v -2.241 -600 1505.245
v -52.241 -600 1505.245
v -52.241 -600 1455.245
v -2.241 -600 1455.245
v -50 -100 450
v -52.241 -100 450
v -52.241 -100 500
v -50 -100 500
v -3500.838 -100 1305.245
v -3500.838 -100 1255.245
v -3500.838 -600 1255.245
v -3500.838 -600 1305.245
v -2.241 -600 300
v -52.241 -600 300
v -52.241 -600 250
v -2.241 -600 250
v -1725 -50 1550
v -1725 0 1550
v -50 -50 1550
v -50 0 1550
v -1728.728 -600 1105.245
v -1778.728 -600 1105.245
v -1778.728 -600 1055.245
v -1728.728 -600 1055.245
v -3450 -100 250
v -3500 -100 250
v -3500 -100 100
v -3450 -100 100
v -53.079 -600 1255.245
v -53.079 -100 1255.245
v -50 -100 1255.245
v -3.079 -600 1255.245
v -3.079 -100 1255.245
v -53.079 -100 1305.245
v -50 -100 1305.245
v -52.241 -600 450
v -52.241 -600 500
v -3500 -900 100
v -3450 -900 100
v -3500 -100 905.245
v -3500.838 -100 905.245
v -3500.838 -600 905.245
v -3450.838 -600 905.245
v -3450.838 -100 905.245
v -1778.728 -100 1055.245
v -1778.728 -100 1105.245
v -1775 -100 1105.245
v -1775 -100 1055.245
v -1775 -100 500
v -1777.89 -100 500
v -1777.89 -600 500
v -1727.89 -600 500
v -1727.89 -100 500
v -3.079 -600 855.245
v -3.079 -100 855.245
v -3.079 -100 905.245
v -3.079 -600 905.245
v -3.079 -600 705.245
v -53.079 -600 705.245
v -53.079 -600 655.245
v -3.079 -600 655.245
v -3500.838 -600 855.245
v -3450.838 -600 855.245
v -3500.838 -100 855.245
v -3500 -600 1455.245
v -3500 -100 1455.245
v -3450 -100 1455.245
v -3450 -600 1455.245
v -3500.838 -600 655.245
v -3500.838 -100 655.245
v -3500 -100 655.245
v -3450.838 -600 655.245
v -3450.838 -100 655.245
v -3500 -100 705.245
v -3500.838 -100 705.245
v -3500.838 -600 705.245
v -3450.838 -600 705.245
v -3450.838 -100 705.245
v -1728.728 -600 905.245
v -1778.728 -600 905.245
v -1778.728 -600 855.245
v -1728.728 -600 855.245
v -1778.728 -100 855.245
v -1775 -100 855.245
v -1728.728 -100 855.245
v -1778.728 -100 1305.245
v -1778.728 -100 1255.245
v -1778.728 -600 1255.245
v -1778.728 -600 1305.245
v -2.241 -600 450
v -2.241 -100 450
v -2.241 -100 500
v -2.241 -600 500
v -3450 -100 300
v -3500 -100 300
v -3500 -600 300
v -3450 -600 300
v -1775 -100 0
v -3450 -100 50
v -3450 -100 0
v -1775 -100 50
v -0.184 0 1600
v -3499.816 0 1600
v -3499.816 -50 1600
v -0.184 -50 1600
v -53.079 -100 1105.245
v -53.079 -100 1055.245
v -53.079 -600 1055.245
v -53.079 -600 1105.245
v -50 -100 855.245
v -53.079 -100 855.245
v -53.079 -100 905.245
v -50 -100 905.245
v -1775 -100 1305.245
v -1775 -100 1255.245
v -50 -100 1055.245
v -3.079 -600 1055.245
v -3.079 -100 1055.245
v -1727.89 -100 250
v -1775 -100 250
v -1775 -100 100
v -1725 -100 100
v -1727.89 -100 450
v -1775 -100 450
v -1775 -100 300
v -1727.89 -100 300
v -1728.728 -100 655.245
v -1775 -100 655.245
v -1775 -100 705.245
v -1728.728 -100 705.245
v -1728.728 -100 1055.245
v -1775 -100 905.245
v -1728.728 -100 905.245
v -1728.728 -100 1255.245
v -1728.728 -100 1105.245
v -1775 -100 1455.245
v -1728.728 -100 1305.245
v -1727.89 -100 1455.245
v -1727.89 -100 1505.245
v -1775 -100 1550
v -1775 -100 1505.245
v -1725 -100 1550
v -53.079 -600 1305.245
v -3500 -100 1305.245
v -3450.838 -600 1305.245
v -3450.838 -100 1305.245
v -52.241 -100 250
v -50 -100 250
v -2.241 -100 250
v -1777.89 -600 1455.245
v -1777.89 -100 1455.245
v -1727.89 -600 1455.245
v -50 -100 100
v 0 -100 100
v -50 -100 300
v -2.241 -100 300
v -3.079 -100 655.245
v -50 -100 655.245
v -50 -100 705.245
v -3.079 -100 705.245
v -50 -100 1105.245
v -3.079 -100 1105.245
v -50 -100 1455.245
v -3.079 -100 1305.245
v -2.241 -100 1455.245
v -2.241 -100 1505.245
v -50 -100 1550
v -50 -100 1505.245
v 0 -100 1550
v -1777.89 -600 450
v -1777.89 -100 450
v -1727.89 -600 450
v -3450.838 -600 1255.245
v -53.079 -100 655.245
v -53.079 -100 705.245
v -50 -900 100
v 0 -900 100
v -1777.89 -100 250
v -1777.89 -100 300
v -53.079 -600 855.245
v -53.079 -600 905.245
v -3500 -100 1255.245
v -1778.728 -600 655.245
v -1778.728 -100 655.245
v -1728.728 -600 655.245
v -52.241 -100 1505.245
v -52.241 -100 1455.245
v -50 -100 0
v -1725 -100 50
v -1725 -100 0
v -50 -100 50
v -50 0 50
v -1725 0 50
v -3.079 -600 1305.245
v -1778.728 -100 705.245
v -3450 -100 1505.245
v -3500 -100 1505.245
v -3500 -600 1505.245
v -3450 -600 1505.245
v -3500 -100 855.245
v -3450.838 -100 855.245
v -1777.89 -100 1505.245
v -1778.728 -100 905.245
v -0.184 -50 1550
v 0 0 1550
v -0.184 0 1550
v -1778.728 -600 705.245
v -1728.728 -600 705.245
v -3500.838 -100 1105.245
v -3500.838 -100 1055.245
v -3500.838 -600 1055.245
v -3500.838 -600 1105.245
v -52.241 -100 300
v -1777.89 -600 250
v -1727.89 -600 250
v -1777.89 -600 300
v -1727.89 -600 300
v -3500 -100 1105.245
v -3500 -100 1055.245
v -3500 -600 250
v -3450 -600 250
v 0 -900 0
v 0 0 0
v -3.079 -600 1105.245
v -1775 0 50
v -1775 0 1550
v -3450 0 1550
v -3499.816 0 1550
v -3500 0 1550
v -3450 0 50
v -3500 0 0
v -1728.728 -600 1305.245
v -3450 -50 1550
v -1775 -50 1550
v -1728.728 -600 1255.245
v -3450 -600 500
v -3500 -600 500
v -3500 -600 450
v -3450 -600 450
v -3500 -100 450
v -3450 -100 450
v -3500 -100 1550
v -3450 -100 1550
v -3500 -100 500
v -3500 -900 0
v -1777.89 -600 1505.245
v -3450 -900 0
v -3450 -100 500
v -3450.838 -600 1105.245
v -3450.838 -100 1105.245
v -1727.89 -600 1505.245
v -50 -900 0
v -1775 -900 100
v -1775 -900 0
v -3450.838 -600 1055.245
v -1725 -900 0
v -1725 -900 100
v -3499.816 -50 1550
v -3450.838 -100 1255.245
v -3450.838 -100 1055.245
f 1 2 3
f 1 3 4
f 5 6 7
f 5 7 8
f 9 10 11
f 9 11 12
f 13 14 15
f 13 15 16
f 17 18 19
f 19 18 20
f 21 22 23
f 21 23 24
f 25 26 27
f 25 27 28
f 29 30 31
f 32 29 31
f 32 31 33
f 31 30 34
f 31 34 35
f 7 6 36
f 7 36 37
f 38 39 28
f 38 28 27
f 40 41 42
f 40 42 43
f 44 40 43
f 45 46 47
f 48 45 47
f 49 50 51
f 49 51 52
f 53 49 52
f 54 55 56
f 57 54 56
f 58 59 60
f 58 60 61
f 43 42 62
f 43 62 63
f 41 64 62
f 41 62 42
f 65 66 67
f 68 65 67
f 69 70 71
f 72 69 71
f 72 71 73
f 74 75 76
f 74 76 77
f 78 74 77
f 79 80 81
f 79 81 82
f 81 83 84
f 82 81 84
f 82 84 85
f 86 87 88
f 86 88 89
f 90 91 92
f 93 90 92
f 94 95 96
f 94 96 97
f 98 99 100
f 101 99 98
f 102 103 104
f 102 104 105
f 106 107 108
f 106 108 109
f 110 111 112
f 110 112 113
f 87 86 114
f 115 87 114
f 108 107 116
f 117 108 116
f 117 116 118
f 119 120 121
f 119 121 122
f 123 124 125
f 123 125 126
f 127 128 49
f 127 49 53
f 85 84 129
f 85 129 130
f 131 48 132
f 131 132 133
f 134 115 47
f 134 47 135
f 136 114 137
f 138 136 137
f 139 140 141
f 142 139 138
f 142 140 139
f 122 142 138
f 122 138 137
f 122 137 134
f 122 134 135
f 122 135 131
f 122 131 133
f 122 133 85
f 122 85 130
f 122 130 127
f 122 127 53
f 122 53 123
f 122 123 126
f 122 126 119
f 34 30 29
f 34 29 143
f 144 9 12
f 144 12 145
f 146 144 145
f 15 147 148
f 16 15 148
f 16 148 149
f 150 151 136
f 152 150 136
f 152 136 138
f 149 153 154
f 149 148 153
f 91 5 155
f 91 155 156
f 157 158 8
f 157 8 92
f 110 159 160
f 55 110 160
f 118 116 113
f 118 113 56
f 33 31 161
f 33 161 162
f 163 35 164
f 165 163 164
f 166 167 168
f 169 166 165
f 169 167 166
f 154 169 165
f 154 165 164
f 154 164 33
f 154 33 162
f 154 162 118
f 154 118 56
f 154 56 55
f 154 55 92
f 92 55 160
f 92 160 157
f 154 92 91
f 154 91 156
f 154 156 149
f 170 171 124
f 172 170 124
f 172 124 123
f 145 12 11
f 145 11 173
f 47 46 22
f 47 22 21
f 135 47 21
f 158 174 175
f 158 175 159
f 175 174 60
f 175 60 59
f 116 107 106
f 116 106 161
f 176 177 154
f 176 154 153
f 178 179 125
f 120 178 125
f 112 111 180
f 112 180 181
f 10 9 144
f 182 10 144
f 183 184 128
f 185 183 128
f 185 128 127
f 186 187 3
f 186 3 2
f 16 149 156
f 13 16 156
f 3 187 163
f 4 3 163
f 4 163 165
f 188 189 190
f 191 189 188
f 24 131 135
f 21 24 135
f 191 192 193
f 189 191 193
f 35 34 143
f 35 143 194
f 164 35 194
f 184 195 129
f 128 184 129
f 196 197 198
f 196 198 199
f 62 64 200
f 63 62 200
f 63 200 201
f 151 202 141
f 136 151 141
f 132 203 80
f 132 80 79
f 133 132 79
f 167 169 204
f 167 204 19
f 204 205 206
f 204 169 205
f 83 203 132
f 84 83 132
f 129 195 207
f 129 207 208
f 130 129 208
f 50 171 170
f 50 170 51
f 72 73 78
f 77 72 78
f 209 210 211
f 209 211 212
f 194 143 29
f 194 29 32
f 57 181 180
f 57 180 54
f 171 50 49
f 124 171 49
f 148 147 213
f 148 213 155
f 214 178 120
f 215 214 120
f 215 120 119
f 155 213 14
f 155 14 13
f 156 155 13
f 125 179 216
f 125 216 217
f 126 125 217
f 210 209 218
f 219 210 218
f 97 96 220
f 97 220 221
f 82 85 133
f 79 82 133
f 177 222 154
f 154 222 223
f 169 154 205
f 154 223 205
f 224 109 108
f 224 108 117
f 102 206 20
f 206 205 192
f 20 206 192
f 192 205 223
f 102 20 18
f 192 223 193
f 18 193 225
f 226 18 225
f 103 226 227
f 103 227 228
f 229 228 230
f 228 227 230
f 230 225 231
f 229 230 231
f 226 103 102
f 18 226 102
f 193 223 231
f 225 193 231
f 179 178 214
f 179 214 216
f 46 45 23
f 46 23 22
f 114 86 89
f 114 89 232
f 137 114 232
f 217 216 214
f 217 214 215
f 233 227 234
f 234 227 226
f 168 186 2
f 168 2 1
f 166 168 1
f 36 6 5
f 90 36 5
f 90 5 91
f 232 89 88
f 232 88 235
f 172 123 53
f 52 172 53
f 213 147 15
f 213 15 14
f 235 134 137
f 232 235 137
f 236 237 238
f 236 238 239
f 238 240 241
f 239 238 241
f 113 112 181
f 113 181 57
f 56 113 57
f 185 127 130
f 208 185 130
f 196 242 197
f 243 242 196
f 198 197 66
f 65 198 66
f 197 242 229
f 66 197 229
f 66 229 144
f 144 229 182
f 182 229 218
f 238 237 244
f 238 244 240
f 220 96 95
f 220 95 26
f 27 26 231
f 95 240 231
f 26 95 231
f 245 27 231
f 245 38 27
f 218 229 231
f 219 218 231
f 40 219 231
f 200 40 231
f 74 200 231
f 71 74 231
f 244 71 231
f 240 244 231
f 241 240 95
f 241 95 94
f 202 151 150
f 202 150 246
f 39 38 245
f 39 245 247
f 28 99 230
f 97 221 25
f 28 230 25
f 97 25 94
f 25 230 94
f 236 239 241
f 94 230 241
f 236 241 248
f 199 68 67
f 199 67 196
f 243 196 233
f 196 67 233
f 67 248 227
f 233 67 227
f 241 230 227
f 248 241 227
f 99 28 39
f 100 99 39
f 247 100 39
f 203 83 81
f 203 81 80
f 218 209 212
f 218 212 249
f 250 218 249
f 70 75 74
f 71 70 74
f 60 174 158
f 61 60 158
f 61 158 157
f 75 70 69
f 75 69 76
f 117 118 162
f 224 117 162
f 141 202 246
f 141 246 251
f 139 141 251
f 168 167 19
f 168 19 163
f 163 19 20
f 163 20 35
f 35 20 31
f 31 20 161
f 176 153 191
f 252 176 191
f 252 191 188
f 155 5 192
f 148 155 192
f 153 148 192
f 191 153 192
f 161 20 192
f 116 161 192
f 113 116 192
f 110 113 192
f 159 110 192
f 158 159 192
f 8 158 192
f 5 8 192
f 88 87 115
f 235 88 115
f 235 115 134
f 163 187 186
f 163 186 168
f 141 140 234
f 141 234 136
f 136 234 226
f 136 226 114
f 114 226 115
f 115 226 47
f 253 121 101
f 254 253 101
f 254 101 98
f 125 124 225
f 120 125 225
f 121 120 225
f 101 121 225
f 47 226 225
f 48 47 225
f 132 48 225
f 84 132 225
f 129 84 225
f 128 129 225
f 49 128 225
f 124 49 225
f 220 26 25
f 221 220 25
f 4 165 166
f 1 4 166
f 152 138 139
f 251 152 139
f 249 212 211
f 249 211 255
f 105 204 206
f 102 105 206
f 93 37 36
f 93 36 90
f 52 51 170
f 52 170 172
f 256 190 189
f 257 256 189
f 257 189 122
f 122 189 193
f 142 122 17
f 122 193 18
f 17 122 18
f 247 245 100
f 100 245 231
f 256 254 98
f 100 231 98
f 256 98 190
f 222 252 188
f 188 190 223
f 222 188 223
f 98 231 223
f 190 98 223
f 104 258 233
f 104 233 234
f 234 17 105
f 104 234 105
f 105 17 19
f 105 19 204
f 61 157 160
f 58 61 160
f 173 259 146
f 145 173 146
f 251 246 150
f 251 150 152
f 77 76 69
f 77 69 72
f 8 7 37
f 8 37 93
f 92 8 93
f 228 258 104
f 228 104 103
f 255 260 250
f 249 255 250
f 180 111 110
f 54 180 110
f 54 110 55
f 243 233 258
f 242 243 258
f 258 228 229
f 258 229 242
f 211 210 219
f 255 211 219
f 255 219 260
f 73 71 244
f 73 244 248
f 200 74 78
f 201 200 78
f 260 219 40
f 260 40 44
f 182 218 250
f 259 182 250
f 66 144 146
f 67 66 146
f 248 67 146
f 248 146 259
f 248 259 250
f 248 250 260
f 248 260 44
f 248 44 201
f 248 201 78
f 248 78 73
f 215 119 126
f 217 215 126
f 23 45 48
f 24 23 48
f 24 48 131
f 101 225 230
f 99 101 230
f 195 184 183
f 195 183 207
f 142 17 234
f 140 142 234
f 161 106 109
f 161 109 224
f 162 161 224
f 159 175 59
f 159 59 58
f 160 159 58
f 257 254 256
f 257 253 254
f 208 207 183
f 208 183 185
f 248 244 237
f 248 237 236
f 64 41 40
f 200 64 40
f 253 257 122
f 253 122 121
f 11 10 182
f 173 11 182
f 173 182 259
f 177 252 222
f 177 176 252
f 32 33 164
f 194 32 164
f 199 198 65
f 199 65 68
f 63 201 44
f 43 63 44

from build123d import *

# Parameters (mm, degrees)
F1_DEPTH = 100
F3_DEPTH = 800
F4_W     = 1749.815702
F4_H     = 50
F5_DEPTH = 50
F6_W     = 50
F6_H     = 50
F7_DEPTH = 500
F8_DEPTH = 25


with BuildPart() as f1:
    # F0 (on Front) → F1 (new body)
    with BuildSketch(Plane.XZ):
        Polygon((-3500, 0), (0, 0), (0, 1550), (-50, 1550), (-50, 50), (-1725, 50), (-1725, 1550), (-1775, 1550), (-1775, 50), (-3450, 50), (-3450, 1550), (-3500, 1550), align=None)
    extrude(amount=F1_DEPTH)

    # F2 (on face) → F3 (join)
    with BuildSketch(Plane.XZ.offset(100)):
        Polygon((-1775, 50), (-1775, 0), (-1725, 0), (-1725, 50), (-1725, 100), (-1775, 100), align=None)
        Polygon((-3500, 100), (-3500, 0), (-3450, 0), (-3450, 50), (-3450, 100), align=None)
        Polygon((-50, 50), (-50, 0), (0, 0), (0, 100), (-50, 100), align=None)
    extrude(amount=F3_DEPTH)

    # F4 (on face) → F5 (join)
    with BuildSketch(Plane.XY.offset(1550)):
        with Locations((-875.092149, -25)):
            Rectangle(F4_W, F4_H)
        with Locations((-2624.907851, -25)):
            Rectangle(F4_W, F4_H)
    extrude(amount=F5_DEPTH)

    # F6 (on face) → F7 (join)
    with BuildSketch(Plane.XZ.offset(100)):
        with Locations((-3475, 275)):
            Rectangle(F6_W, F6_H)
        with Locations((-3475, 475)):
            Rectangle(F6_W, F6_H)
        with Locations((-3475.837822, 680.244577)):
            Rectangle(F6_W, F6_H)
        with Locations((-3475.837822, 880.244577)):
            Rectangle(F6_W, F6_H)
        with Locations((-3475.837822, 1080.244577)):
            Rectangle(F6_W, F6_H)
        with Locations((-3475.837822, 1280.244577)):
            Rectangle(F6_W, F6_H)
        with Locations((-3475, 1480.244577)):
            Rectangle(F6_W, F6_H)
        with Locations((-1752.889729, 275)):
            Rectangle(F6_W, F6_H)
        with Locations((-1752.889729, 475)):
            Rectangle(F6_W, F6_H)
        with Locations((-1753.727551, 680.244577)):
            Rectangle(F6_W, F6_H)
        with Locations((-1753.727551, 880.244577)):
            Rectangle(F6_W, F6_H)
        with Locations((-1753.727551, 1080.244577)):
            Rectangle(F6_W, F6_H)
        with Locations((-1753.727551, 1280.244577)):
            Rectangle(F6_W, F6_H)
        with Locations((-1752.889729, 1480.244577)):
            Rectangle(F6_W, F6_H)
        with Locations((-27.241493, 275)):
            Rectangle(F6_W, F6_H)
        with Locations((-27.241493, 475)):
            Rectangle(F6_W, F6_H)
        with Locations((-28.079315, 680.244577)):
            Rectangle(F6_W, F6_H)
        with Locations((-28.079315, 880.244577)):
            Rectangle(F6_W, F6_H)
        with Locations((-28.079315, 1080.244577)):
            Rectangle(F6_W, F6_H)
        with Locations((-28.079315, 1280.244577)):
            Rectangle(F6_W, F6_H)
        with Locations((-27.241493, 1480.244577)):
            Rectangle(F6_W, F6_H)
    extrude(amount=F7_DEPTH)

    # F6 (on face) → F8 (join)
    with BuildSketch(Plane.XZ.offset(100)):
        with Locations((-3475, 275)):
            Rectangle(F6_W, F6_H)
        with Locations((-3475, 475)):
            Rectangle(F6_W, F6_H)
        with Locations((-3475.837822, 680.244577)):
            Rectangle(F6_W, F6_H)
        with Locations((-3475.837822, 880.244577)):
            Rectangle(F6_W, F6_H)
        with Locations((-3475.837822, 1080.244577)):
            Rectangle(F6_W, F6_H)
        with Locations((-3475.837822, 1280.244577)):
            Rectangle(F6_W, F6_H)
        with Locations((-3475, 1480.244577)):
            Rectangle(F6_W, F6_H)
        with Locations((-1752.889729, 275)):
            Rectangle(F6_W, F6_H)
        with Locations((-1752.889729, 475)):
            Rectangle(F6_W, F6_H)
        with Locations((-1753.727551, 680.244577)):
            Rectangle(F6_W, F6_H)
        with Locations((-1753.727551, 880.244577)):
            Rectangle(F6_W, F6_H)
        with Locations((-1753.727551, 1080.244577)):
            Rectangle(F6_W, F6_H)
        with Locations((-1753.727551, 1280.244577)):
            Rectangle(F6_W, F6_H)
        with Locations((-1752.889729, 1480.244577)):
            Rectangle(F6_W, F6_H)
        with Locations((-27.241493, 275)):
            Rectangle(F6_W, F6_H)
        with Locations((-27.241493, 475)):
            Rectangle(F6_W, F6_H)
        with Locations((-28.079315, 680.244577)):
            Rectangle(F6_W, F6_H)
        with Locations((-28.079315, 880.244577)):
            Rectangle(F6_W, F6_H)
        with Locations((-28.079315, 1080.244577)):
            Rectangle(F6_W, F6_H)
        with Locations((-28.079315, 1280.244577)):
            Rectangle(F6_W, F6_H)
        with Locations((-27.241493, 1480.244577)):
            Rectangle(F6_W, F6_H)
    extrude(amount=F8_DEPTH)


solid = f1.part
